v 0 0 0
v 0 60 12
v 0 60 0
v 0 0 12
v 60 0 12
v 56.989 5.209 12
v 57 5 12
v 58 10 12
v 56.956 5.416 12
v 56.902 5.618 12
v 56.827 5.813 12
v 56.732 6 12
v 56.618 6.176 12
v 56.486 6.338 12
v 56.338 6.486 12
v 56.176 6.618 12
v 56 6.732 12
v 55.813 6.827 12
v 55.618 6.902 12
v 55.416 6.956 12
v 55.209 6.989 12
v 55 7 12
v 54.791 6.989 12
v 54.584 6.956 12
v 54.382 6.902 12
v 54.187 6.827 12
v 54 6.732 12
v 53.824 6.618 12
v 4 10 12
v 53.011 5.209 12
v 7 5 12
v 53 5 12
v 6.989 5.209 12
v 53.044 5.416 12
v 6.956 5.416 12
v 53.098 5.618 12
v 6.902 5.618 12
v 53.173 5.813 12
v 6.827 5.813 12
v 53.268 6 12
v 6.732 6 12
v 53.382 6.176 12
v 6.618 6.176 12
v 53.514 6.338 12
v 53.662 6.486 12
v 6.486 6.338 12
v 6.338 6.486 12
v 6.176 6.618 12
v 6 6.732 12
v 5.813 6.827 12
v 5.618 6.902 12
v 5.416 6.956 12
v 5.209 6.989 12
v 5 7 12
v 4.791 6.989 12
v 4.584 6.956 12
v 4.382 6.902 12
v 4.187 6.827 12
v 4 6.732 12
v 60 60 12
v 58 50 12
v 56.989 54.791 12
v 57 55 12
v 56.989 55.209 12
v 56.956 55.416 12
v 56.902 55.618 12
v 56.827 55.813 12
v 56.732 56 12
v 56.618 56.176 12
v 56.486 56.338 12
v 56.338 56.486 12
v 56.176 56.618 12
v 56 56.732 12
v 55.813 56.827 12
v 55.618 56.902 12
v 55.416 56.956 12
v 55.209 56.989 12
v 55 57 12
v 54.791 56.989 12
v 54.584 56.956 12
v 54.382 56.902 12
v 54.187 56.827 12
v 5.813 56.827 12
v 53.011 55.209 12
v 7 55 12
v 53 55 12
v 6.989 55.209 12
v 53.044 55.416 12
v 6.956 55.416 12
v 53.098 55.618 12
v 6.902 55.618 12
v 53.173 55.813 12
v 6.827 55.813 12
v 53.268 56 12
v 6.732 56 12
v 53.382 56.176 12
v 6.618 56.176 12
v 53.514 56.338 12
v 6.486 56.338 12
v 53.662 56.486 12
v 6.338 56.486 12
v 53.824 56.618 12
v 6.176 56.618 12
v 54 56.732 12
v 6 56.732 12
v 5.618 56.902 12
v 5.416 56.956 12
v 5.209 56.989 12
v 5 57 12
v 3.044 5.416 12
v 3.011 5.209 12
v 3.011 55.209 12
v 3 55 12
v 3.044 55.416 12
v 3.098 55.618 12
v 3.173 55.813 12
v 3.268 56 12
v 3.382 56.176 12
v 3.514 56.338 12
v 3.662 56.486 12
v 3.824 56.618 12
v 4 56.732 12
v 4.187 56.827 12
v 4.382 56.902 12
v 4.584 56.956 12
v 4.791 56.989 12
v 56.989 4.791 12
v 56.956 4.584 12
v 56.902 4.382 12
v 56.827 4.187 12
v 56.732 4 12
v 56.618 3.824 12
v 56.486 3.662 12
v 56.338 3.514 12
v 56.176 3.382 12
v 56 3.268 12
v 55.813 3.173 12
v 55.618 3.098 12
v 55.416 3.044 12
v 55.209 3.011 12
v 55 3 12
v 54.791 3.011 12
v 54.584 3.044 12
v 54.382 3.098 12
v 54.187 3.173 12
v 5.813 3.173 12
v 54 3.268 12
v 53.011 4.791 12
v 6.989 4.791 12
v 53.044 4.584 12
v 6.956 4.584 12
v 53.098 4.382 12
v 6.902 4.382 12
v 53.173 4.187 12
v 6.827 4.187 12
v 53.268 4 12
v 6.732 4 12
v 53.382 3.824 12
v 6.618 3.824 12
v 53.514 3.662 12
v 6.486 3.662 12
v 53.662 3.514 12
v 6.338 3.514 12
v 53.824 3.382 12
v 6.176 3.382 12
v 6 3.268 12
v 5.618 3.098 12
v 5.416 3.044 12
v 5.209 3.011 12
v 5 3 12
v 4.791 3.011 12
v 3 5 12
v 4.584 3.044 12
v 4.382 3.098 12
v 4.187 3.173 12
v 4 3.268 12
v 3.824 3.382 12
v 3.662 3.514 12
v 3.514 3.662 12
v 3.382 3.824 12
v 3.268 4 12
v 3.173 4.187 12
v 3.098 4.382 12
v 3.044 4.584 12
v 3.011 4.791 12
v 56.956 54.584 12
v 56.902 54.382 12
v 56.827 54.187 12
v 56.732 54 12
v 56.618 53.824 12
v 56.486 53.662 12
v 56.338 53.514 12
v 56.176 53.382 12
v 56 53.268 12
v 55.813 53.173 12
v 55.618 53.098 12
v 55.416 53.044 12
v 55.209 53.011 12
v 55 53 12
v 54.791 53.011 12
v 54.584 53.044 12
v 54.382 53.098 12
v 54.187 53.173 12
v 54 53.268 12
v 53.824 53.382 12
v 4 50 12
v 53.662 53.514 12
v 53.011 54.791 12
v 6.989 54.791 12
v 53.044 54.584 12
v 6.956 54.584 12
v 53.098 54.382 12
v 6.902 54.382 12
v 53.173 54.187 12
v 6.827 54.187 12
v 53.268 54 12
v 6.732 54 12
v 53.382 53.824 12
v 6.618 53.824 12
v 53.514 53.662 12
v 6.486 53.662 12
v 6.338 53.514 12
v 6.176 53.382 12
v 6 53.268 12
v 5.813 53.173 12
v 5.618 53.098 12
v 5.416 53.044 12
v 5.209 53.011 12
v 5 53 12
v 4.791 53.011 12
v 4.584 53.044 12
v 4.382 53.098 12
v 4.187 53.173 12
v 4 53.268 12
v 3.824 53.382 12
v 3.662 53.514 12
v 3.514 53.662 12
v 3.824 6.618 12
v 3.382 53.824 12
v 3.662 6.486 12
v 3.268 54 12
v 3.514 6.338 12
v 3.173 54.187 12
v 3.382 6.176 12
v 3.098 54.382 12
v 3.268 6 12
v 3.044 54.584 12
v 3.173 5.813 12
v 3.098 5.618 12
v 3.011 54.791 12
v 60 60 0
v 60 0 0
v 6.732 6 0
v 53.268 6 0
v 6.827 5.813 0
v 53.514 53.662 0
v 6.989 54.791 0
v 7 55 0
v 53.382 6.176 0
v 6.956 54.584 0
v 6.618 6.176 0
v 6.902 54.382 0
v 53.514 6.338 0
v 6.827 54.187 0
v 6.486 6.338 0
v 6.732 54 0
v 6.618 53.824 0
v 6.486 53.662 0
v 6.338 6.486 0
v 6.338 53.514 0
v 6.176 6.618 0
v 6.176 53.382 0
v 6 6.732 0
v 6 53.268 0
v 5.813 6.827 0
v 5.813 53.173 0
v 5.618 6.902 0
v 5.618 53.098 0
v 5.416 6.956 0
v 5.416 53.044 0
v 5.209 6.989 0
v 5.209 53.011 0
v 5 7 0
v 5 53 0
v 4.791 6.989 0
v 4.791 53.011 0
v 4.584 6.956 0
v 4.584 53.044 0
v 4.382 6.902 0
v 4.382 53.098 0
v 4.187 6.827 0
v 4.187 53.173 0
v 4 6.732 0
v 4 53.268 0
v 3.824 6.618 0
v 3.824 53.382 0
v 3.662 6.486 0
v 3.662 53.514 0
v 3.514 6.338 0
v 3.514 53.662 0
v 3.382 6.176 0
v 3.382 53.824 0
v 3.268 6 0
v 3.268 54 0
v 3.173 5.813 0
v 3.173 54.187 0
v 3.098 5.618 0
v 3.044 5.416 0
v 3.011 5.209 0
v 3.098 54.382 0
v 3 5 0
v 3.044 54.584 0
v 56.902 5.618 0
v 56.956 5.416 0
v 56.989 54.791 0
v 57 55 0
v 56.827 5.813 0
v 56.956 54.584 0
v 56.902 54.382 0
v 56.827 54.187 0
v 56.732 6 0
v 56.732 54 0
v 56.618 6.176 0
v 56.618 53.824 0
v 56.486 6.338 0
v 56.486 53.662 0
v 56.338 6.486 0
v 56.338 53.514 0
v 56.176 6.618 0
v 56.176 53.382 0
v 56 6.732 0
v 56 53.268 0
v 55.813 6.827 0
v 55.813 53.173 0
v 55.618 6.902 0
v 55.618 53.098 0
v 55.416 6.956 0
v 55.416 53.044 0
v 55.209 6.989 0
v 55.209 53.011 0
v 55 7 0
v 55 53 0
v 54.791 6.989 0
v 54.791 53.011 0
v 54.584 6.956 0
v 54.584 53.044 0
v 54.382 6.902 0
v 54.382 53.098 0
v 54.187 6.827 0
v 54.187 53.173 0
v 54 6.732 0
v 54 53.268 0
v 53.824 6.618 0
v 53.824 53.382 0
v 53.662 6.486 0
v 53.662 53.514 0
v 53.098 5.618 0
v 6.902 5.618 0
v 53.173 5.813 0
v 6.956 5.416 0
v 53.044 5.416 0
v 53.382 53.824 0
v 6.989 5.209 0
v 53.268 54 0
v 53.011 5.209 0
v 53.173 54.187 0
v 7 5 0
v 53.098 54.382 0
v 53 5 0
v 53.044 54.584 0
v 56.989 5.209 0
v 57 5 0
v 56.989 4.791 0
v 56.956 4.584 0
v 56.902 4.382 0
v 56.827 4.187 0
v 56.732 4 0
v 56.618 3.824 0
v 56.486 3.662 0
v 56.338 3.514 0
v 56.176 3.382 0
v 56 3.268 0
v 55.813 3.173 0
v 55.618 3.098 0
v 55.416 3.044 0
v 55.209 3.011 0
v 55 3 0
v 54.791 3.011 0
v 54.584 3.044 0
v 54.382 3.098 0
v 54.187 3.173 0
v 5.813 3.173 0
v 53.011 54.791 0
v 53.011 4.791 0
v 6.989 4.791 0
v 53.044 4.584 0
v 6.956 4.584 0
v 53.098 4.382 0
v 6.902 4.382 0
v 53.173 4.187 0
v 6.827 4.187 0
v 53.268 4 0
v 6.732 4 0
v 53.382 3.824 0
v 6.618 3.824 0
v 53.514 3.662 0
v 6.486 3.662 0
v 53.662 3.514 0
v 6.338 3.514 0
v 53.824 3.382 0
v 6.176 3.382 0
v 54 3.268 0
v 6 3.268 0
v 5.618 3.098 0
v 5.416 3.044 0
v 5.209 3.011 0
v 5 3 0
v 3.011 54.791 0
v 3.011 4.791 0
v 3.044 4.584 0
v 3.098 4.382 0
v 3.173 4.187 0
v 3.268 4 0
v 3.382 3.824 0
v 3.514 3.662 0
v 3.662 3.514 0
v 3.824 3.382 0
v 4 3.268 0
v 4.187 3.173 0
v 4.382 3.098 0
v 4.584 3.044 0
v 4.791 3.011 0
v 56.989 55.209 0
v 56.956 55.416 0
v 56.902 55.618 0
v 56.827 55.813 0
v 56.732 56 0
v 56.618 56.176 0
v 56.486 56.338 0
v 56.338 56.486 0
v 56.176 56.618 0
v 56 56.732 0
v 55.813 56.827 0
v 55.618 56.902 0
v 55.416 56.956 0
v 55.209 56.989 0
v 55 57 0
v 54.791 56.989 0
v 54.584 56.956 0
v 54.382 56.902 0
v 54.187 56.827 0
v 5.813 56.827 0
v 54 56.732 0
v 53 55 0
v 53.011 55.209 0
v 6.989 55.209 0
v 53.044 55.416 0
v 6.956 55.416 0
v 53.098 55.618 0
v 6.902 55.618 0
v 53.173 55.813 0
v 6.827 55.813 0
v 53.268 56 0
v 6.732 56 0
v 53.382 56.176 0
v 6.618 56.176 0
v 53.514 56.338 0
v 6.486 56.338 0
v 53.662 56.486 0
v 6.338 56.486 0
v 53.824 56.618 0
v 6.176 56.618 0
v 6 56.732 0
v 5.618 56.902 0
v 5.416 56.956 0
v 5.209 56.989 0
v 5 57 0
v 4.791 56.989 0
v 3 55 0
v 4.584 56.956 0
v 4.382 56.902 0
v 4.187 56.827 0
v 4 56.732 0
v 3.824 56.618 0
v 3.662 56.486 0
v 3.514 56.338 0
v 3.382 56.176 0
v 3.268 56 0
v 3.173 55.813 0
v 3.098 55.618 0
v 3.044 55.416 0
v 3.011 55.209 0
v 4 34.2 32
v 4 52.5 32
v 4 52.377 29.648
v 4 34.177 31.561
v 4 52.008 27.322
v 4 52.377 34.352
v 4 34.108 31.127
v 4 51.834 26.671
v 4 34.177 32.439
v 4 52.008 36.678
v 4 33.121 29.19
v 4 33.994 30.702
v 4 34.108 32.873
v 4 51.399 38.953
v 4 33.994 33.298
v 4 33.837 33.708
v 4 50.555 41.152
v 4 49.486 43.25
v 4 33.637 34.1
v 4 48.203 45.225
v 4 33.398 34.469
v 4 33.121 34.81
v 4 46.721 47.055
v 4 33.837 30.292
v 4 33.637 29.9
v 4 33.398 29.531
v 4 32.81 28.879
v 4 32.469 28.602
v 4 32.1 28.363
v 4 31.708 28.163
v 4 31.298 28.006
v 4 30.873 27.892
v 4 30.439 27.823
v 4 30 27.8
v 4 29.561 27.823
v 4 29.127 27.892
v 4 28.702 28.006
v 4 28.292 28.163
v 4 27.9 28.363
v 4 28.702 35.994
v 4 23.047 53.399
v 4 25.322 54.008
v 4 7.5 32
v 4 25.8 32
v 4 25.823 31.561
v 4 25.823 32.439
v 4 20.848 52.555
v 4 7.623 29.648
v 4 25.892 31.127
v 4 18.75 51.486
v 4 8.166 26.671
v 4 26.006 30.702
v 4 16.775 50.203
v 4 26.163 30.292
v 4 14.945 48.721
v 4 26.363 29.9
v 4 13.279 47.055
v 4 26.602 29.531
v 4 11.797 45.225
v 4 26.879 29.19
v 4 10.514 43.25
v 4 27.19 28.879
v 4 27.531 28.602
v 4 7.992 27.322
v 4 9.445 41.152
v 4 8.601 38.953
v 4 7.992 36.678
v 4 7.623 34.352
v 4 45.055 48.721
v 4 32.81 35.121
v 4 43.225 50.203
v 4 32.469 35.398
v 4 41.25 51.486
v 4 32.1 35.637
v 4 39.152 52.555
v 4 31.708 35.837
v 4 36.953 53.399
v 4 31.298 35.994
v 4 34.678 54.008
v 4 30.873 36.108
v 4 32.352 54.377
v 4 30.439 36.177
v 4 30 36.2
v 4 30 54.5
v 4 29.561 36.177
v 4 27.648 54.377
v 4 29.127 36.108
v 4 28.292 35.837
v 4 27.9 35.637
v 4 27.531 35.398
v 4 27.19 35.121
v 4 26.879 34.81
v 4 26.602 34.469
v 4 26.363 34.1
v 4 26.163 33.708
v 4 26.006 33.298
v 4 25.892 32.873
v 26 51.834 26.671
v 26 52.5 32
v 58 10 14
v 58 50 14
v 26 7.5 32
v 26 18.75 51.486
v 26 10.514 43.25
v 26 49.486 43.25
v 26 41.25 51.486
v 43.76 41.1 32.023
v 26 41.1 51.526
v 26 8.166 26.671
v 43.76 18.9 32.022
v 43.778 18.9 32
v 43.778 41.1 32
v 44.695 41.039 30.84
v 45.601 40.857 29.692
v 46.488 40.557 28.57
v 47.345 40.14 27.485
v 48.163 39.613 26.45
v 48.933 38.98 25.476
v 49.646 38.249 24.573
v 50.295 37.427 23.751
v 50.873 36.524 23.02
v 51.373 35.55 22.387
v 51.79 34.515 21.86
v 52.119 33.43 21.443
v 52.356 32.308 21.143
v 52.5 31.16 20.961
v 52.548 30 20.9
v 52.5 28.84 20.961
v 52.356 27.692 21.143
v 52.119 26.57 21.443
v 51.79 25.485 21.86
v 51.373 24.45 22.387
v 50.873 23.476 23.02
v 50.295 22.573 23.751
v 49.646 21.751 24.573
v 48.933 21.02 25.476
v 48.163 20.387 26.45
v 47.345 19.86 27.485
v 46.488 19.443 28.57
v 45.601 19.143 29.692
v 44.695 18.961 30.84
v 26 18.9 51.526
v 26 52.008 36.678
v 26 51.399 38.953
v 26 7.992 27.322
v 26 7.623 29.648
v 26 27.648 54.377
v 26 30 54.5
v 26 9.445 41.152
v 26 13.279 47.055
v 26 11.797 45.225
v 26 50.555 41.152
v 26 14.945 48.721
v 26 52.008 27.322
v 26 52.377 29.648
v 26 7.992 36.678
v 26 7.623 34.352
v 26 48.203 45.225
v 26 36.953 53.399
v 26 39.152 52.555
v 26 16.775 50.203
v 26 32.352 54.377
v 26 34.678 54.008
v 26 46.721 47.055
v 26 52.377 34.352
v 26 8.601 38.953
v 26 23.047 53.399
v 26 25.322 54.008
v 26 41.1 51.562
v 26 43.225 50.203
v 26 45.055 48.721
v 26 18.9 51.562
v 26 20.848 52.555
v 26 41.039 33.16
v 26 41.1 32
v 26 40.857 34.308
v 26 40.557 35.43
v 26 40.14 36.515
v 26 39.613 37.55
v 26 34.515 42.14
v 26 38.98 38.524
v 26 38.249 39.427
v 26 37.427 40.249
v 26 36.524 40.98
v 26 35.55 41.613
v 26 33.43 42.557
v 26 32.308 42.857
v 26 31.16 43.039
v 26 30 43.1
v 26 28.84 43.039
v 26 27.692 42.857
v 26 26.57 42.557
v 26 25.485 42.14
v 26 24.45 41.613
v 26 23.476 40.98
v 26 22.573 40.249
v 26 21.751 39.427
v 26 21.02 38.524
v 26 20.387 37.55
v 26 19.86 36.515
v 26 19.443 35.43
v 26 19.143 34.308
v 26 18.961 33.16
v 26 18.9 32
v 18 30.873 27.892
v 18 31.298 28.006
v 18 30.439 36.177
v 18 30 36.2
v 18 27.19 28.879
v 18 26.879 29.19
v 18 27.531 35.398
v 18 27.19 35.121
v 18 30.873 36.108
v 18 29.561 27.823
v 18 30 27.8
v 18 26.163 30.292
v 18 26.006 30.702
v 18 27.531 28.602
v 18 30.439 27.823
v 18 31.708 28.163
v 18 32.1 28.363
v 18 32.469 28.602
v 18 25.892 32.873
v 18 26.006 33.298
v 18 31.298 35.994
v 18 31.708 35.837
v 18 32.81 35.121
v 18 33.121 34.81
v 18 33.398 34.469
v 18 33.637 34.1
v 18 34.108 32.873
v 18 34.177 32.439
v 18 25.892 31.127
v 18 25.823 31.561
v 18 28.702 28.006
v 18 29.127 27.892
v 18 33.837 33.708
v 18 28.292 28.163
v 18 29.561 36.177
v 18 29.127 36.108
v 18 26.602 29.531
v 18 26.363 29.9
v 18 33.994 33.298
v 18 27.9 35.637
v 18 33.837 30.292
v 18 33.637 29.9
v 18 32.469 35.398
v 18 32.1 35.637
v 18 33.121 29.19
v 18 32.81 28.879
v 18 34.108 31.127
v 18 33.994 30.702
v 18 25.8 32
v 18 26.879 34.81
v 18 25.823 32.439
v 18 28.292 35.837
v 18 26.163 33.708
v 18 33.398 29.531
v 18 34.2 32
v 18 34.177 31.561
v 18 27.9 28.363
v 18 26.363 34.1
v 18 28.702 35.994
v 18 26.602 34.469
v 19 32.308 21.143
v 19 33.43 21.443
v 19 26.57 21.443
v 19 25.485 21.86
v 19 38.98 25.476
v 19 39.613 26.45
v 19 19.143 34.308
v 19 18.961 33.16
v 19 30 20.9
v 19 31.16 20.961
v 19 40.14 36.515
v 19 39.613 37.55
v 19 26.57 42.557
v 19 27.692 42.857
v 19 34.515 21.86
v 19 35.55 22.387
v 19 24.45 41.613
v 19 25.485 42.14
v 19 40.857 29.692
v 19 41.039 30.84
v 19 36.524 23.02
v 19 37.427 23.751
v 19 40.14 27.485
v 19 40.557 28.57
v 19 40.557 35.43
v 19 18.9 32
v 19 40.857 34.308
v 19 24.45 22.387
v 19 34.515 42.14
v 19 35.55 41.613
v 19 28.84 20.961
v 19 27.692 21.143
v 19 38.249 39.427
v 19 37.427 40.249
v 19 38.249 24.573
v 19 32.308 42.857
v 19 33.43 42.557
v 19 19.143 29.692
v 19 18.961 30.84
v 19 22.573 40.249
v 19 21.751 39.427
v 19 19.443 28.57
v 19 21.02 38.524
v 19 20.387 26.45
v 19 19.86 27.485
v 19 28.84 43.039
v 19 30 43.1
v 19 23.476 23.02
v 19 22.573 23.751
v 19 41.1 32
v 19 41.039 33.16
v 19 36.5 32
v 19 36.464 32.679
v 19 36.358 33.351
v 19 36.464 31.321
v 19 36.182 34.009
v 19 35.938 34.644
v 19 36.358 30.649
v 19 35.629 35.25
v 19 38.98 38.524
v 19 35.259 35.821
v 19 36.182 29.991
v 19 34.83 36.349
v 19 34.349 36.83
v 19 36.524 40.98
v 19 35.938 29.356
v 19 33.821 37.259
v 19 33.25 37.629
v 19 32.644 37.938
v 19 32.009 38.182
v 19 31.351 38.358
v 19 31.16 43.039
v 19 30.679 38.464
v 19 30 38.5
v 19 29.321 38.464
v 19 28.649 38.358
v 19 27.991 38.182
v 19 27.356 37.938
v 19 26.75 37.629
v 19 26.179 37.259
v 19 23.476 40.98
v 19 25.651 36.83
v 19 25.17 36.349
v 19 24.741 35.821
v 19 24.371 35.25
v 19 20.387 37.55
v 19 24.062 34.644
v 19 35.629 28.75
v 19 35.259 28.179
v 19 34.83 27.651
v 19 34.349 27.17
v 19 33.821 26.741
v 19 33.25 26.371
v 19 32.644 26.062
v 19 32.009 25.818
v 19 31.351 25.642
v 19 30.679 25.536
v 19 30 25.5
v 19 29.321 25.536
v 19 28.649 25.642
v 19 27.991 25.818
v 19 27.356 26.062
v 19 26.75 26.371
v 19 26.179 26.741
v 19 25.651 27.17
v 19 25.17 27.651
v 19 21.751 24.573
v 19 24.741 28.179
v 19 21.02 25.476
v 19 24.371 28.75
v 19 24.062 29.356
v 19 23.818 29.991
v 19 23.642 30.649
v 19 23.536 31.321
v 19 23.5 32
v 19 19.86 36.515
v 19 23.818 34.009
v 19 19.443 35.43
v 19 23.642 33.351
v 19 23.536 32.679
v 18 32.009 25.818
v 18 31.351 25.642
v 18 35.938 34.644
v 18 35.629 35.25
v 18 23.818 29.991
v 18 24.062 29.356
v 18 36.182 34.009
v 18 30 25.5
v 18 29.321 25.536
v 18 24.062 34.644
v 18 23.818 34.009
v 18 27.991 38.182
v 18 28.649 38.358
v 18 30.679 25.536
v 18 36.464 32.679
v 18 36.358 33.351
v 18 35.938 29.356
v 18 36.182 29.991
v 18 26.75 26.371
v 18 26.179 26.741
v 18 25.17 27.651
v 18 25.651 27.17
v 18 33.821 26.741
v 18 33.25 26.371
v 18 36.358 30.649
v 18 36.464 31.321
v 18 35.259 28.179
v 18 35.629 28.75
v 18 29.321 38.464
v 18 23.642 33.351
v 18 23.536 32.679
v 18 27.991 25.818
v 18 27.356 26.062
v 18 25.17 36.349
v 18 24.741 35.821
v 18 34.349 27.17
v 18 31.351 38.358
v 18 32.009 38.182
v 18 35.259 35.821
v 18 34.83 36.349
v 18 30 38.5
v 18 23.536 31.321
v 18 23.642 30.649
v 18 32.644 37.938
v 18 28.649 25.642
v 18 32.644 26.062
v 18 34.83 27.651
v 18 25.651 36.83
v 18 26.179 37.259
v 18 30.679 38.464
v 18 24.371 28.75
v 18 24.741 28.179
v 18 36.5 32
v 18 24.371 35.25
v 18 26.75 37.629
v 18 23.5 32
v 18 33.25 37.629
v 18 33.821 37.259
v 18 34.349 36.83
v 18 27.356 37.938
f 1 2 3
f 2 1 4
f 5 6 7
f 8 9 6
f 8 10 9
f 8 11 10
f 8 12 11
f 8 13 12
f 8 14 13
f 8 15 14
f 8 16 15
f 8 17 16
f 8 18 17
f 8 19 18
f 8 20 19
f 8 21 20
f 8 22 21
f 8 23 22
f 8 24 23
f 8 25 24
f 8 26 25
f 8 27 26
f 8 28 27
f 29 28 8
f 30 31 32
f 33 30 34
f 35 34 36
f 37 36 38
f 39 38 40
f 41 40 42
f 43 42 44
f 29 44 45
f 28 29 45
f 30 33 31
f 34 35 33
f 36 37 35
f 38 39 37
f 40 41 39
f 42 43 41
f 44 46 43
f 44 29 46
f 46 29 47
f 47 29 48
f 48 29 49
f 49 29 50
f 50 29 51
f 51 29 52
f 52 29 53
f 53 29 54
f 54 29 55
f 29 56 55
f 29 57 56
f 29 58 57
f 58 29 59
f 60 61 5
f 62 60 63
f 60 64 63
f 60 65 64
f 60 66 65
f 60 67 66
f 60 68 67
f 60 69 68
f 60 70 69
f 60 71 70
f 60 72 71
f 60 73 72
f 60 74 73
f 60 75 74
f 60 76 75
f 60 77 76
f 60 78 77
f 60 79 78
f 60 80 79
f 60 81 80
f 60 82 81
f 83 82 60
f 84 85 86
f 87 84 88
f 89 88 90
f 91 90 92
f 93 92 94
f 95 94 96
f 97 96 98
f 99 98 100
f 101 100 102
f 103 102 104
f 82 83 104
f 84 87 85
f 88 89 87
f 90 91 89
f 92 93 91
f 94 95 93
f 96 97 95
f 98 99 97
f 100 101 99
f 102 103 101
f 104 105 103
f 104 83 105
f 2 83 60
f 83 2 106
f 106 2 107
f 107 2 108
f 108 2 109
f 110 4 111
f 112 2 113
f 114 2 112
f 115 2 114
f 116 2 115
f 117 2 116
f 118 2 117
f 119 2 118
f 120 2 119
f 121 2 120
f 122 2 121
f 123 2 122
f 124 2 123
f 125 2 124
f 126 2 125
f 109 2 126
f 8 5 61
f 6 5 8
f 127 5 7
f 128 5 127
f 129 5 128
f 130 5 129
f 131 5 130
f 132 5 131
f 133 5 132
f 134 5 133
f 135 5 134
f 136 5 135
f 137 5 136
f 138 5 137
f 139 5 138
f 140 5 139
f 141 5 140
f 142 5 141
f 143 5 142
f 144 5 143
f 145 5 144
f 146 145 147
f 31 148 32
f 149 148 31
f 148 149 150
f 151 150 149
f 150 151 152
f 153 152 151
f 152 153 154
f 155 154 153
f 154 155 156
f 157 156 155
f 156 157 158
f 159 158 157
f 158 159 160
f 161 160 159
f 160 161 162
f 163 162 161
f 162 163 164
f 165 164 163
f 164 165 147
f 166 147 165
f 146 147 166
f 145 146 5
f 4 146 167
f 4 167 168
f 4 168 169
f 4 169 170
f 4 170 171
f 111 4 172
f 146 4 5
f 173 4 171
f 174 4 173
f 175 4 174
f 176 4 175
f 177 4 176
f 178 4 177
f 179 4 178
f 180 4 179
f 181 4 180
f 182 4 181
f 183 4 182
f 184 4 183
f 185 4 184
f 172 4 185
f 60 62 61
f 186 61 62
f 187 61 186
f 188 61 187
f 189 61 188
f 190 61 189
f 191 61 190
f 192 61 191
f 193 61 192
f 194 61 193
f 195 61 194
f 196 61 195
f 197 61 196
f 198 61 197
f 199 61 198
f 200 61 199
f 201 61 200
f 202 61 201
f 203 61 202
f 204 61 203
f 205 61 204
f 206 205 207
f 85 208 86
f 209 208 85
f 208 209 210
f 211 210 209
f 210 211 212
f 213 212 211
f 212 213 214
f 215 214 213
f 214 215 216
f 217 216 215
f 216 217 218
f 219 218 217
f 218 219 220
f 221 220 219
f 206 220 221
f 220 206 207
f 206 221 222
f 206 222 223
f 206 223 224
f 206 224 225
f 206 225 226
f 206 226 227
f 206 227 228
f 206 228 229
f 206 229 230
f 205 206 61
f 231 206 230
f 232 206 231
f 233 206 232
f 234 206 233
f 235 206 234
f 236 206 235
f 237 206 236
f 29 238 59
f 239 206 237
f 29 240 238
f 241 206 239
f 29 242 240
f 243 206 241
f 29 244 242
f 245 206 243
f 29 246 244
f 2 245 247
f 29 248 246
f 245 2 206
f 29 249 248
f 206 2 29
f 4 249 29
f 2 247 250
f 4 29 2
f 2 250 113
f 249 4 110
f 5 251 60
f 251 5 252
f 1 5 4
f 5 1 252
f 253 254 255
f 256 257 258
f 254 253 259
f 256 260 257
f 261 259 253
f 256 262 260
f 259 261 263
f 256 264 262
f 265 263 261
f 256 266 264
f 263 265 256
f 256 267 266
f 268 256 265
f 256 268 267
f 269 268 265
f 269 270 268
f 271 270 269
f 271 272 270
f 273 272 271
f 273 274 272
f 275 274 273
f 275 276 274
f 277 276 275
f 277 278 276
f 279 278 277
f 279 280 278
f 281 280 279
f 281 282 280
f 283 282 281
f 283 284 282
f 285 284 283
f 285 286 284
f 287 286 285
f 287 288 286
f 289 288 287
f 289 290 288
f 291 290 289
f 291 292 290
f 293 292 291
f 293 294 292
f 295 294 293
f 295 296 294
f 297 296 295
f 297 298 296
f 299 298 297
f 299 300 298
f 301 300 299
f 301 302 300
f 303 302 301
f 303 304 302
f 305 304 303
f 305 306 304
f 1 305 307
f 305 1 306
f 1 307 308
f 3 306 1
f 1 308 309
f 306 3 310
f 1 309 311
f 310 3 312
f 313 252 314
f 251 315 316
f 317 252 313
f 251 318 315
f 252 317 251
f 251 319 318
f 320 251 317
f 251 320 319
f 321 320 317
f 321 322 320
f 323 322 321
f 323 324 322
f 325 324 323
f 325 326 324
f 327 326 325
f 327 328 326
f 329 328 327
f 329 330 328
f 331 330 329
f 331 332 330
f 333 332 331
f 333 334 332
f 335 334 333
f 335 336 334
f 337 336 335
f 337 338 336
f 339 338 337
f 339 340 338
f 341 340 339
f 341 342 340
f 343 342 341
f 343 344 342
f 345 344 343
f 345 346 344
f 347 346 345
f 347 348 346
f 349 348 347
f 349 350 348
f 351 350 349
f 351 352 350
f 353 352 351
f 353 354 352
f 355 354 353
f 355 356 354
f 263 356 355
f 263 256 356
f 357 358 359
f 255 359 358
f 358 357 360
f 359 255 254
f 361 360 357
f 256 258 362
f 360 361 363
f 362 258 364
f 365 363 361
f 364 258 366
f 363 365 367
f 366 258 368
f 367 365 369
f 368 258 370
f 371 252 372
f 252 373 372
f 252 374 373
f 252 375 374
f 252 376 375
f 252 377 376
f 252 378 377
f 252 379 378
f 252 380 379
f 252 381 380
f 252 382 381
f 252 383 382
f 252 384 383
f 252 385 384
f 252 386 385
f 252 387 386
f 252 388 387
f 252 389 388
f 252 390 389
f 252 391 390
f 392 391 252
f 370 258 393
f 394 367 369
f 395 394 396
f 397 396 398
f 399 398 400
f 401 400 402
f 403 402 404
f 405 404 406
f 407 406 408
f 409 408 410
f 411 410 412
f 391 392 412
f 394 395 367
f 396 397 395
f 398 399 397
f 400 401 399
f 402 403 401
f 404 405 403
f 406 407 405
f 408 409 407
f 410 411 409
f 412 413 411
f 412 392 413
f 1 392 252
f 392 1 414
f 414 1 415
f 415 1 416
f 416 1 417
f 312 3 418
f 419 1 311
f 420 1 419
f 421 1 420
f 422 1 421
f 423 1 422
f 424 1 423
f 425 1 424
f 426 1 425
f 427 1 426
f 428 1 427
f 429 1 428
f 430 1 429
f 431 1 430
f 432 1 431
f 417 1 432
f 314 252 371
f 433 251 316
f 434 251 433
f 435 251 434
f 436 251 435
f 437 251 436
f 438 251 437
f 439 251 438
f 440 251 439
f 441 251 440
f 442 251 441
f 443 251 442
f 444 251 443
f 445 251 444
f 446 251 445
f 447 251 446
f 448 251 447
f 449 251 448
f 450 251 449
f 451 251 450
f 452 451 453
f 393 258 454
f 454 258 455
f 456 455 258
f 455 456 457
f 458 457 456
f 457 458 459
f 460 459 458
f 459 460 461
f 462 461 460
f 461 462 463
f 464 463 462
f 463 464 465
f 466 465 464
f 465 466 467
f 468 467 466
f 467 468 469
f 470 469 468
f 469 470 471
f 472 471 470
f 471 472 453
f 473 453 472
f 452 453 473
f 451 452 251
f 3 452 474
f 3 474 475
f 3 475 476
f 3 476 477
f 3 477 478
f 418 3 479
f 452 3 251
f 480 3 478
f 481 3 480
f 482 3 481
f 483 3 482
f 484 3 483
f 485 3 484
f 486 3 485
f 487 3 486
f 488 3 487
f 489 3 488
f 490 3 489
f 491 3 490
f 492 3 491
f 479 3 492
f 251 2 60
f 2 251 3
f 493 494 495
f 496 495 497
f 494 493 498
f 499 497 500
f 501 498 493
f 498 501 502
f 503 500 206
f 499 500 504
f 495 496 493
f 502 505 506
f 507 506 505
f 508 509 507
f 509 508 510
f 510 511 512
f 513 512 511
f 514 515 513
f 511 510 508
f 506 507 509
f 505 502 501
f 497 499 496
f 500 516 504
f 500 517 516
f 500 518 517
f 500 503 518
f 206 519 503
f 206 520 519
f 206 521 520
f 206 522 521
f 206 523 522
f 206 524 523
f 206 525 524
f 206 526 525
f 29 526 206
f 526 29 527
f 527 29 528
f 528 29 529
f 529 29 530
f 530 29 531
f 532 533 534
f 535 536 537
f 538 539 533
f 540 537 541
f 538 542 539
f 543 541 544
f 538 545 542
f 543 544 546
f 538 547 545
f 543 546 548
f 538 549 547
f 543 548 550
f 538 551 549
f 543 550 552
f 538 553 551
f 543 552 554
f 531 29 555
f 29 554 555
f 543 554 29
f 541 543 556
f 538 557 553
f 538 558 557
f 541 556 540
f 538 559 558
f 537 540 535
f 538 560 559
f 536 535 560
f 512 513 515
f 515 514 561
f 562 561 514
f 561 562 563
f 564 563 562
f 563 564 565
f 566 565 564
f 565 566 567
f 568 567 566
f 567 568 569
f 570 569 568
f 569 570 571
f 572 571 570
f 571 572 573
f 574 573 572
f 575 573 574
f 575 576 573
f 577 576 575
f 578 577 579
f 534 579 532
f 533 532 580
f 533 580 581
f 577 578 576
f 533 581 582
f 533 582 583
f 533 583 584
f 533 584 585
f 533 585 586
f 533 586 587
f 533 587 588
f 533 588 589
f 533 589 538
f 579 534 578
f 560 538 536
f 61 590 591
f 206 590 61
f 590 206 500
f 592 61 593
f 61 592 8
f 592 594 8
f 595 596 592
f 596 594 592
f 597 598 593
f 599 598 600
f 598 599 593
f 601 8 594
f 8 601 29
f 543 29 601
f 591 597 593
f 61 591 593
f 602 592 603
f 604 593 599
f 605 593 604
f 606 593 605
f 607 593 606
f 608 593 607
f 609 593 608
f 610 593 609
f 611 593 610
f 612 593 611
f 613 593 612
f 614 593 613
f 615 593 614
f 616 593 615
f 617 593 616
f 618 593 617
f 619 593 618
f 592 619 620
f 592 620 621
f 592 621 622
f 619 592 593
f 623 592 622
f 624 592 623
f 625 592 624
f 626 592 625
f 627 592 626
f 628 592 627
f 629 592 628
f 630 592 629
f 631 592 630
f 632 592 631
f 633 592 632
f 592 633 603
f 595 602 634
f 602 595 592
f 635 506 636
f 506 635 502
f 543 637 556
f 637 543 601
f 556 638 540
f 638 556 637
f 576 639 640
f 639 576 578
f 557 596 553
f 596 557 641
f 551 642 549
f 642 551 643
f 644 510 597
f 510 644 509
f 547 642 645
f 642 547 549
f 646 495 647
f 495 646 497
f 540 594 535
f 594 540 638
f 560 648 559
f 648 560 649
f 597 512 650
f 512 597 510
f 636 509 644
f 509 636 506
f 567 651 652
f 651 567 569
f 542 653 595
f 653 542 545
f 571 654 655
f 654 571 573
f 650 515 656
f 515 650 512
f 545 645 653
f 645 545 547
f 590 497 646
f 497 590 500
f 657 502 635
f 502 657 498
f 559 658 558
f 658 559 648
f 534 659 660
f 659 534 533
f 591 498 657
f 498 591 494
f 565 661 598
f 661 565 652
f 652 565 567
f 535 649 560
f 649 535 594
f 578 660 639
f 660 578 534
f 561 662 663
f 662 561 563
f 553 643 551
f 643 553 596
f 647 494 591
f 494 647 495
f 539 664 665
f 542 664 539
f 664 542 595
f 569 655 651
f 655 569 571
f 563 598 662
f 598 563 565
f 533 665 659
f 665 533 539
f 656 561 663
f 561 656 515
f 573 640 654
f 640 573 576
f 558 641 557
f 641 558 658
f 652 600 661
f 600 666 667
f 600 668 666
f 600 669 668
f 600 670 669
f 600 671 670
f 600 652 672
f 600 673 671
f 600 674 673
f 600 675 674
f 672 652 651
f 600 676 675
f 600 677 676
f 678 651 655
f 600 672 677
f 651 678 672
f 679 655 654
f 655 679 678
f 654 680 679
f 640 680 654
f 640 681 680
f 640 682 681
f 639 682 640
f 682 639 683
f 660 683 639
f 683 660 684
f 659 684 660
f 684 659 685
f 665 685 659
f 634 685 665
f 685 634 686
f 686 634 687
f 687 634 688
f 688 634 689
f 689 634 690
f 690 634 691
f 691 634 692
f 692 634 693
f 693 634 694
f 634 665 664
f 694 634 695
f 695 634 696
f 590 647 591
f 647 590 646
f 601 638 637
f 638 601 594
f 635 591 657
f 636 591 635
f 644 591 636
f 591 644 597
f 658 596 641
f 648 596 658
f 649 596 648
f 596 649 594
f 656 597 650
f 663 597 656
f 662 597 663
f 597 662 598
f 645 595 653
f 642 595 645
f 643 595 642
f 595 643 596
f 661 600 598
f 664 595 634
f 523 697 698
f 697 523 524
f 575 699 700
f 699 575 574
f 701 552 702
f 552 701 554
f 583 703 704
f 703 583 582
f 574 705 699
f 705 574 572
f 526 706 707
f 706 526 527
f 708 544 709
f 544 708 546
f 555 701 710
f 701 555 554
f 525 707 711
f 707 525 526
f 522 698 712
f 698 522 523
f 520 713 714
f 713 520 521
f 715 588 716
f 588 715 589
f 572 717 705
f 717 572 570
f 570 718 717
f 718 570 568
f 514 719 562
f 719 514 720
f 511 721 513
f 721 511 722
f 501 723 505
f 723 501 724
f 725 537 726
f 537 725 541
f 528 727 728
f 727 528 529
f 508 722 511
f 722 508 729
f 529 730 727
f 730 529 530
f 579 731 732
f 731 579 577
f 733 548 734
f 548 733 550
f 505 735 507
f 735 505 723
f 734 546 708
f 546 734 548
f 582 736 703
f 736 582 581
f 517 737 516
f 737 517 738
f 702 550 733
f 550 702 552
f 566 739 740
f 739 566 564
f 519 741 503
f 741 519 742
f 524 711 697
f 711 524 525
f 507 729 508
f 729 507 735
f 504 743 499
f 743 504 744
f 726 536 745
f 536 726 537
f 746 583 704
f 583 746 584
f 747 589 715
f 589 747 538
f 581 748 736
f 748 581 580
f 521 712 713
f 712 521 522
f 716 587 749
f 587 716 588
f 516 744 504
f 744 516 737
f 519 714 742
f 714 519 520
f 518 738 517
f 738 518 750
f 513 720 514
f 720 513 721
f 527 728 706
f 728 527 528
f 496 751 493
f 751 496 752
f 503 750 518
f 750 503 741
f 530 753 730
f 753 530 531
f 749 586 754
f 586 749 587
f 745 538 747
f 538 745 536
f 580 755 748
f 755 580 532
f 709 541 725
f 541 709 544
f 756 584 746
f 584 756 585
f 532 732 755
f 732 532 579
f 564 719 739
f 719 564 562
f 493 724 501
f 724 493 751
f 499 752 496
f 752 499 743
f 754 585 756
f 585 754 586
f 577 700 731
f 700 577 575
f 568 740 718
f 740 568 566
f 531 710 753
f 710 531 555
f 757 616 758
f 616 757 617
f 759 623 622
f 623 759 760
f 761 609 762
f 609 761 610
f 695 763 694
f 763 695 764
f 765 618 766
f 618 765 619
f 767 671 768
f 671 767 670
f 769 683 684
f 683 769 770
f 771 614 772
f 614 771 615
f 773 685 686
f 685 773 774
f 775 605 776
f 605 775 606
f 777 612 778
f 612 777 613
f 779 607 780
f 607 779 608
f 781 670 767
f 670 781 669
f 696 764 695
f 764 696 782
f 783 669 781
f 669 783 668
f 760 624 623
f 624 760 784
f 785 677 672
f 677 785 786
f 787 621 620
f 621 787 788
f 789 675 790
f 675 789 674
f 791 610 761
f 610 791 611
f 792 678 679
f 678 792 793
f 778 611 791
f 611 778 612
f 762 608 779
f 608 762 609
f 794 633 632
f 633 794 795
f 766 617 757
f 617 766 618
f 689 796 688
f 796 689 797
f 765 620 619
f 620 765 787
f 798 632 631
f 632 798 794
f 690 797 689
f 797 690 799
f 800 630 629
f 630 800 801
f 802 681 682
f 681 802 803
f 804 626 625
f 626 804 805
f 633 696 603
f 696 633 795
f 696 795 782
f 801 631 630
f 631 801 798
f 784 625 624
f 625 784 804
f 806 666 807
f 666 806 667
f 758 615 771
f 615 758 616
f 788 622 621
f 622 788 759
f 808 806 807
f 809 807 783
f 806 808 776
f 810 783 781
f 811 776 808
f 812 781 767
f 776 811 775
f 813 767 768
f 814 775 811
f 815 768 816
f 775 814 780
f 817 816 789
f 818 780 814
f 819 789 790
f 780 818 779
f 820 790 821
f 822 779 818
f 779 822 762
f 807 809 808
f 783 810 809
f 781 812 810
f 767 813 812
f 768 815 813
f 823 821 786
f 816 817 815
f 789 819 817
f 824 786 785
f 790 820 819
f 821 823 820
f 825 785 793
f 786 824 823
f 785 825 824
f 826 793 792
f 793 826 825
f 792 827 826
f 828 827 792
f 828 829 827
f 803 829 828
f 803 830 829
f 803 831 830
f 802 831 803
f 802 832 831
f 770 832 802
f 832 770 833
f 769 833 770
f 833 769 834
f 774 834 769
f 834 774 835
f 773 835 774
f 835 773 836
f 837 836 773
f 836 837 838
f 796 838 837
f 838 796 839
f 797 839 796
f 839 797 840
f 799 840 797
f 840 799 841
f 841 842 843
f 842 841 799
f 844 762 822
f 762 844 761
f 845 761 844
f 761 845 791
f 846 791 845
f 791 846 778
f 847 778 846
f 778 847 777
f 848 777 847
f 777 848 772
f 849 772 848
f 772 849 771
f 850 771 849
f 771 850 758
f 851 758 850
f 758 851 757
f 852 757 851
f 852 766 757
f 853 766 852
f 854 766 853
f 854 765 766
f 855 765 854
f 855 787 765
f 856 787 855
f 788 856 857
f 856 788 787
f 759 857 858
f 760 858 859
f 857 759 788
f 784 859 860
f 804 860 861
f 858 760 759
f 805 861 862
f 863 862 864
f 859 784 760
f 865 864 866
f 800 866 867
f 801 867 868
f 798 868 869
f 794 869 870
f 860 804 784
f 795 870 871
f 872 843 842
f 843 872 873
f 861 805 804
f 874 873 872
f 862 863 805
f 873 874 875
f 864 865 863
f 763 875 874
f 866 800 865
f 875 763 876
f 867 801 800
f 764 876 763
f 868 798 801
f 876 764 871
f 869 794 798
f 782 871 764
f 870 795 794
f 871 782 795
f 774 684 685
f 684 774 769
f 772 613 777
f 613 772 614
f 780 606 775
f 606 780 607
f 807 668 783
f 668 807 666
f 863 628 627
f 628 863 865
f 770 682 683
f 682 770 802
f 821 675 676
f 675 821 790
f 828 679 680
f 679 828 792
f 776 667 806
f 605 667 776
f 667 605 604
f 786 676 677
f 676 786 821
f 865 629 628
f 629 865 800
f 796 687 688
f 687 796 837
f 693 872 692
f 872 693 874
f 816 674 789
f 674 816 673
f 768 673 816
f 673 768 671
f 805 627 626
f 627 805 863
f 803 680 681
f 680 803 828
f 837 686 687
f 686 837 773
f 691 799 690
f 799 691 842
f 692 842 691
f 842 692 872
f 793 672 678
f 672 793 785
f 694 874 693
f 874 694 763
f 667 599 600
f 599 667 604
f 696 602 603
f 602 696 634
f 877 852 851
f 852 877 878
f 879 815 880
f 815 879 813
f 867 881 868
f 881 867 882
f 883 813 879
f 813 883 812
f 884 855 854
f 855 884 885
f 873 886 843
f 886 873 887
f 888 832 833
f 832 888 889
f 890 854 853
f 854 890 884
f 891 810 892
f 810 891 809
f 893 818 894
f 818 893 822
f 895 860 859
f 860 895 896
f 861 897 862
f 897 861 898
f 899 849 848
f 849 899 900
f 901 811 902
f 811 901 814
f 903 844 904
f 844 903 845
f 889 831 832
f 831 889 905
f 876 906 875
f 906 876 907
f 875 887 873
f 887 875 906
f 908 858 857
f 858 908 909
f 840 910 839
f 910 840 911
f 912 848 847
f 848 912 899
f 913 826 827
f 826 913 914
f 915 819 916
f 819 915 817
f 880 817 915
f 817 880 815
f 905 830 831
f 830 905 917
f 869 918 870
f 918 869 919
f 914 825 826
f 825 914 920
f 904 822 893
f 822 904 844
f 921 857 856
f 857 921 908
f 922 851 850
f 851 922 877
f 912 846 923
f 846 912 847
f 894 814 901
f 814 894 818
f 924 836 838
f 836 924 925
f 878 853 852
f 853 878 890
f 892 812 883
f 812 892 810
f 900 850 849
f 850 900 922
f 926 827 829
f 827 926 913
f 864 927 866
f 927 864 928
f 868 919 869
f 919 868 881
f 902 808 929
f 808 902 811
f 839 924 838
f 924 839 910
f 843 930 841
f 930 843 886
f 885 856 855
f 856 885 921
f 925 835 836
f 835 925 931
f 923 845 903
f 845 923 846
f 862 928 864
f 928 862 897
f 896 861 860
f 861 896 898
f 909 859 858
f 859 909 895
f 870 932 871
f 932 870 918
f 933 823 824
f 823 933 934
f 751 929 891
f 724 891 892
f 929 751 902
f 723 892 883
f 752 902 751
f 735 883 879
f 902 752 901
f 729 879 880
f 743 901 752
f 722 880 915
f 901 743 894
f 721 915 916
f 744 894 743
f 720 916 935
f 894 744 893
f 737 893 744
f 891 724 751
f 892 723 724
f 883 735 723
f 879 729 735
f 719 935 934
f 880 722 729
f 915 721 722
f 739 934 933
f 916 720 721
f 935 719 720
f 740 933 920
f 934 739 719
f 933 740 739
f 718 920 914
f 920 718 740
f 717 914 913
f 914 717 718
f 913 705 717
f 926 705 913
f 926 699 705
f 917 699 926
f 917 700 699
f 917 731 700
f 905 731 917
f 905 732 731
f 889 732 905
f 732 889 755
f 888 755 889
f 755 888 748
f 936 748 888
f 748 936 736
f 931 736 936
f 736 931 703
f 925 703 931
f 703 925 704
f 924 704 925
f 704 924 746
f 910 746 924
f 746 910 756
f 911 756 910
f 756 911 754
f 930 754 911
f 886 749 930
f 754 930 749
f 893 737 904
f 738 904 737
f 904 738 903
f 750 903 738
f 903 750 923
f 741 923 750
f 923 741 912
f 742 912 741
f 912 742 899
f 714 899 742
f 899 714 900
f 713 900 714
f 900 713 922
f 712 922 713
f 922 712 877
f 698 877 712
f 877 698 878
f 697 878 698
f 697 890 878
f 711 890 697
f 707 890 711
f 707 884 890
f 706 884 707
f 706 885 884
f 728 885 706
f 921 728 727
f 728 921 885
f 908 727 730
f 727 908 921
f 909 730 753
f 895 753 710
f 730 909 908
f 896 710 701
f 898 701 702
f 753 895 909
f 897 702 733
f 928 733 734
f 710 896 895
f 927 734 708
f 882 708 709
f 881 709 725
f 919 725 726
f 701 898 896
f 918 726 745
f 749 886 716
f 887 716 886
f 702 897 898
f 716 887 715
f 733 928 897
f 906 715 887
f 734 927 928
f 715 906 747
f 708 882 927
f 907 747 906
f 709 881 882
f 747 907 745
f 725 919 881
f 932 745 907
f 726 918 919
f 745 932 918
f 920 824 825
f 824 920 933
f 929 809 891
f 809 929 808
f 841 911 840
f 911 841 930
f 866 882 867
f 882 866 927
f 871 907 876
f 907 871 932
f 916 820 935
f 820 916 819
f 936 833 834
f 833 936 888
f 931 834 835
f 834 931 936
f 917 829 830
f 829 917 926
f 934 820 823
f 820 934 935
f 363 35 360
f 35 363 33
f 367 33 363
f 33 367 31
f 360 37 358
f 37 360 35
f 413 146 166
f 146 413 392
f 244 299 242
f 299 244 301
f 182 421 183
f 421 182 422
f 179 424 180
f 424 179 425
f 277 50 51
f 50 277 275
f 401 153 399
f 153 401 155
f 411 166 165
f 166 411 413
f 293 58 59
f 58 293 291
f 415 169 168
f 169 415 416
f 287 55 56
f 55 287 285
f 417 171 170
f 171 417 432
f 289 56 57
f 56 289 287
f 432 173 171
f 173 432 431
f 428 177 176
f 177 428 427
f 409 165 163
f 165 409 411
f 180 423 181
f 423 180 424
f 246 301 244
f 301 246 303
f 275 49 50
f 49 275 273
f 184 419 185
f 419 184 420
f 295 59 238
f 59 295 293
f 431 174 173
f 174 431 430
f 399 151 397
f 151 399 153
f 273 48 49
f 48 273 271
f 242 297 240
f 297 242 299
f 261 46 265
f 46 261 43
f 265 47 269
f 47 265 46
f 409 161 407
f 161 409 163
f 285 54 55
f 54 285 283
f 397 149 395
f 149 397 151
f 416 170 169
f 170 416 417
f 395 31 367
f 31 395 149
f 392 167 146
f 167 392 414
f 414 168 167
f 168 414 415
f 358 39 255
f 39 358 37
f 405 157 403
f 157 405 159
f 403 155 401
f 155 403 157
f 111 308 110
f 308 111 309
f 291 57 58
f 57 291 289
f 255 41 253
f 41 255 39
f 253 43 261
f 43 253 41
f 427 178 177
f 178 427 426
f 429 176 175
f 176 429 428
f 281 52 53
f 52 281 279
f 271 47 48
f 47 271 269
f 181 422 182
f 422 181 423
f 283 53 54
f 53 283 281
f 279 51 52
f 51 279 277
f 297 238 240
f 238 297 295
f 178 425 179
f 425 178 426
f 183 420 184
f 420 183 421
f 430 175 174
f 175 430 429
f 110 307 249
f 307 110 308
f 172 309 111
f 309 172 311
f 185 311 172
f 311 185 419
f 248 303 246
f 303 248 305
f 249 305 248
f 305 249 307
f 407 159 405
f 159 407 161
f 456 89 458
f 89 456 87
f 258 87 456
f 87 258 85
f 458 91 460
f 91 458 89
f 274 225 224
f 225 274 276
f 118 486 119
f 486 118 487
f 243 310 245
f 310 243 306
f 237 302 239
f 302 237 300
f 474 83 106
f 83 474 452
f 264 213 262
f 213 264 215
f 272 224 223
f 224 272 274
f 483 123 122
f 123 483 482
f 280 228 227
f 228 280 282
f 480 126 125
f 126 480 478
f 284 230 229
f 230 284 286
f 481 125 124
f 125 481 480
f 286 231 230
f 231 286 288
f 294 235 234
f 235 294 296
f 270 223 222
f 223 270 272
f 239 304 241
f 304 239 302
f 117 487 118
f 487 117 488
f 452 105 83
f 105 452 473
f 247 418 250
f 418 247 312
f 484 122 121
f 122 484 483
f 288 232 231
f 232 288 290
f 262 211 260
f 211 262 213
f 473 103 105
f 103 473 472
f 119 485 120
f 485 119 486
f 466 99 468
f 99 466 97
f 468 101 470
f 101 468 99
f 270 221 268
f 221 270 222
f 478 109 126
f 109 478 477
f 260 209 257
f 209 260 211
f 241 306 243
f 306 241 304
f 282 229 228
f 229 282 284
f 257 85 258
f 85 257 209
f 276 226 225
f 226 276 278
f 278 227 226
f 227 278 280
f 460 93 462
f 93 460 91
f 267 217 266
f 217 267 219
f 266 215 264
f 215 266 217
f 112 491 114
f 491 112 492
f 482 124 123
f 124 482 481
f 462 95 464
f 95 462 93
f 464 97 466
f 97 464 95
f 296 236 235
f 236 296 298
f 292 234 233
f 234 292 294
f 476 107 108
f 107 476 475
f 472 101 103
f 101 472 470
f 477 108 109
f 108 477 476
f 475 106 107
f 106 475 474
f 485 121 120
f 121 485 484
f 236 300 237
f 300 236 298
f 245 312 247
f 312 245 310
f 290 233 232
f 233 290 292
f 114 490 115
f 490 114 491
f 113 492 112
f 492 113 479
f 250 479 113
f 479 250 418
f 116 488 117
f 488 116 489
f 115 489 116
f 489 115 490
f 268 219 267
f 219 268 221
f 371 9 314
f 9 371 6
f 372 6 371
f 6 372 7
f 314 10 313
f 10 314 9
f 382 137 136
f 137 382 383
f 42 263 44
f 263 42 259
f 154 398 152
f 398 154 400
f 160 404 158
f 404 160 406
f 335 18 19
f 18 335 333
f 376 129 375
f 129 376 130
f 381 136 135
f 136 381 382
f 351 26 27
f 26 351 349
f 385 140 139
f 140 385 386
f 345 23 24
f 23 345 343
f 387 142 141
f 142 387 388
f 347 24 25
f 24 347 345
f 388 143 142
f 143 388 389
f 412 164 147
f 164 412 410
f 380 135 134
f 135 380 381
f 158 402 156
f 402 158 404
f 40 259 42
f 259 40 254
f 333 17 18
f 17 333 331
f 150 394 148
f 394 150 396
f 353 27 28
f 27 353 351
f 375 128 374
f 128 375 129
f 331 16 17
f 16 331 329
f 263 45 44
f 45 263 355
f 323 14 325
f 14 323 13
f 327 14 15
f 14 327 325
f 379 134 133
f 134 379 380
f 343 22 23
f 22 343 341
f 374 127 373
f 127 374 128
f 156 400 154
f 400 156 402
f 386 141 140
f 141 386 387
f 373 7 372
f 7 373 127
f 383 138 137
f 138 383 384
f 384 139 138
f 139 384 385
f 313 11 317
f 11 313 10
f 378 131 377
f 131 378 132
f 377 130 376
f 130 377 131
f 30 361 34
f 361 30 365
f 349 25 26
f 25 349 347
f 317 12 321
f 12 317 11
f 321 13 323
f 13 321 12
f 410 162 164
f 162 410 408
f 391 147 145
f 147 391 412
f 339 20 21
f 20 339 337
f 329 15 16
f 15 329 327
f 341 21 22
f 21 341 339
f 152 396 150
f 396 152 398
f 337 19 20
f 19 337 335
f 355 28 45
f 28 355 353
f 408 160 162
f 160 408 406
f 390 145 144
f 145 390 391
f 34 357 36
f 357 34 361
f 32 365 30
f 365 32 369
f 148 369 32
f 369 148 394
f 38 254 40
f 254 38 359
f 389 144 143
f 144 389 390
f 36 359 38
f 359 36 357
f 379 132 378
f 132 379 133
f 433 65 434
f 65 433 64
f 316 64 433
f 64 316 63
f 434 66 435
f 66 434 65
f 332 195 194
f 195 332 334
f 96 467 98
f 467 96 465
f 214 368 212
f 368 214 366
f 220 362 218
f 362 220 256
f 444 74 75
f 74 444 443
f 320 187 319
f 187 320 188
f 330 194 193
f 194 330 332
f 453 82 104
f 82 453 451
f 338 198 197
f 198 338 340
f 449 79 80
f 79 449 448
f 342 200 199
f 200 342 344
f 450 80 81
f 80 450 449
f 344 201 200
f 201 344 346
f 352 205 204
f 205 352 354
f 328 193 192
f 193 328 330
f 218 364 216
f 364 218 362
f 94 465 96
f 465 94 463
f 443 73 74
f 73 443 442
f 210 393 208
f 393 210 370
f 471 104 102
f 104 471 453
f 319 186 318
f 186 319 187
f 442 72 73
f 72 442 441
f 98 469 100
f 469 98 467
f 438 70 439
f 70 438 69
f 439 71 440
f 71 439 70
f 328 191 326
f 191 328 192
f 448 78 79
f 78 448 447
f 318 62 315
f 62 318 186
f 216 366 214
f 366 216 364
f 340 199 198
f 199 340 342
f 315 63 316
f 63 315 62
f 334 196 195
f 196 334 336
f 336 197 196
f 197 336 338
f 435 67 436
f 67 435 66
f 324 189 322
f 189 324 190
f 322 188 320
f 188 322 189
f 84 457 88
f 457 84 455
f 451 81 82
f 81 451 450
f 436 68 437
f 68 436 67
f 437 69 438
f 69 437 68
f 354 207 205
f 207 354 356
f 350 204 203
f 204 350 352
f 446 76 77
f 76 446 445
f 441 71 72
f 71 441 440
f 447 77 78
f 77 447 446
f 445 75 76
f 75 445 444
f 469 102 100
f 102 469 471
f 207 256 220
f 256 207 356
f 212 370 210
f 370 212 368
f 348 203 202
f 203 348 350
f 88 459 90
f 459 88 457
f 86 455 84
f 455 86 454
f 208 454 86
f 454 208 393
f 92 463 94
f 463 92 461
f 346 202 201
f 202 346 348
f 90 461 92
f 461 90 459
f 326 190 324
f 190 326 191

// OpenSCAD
module plate() {
	distance=20;
	difference() {
		union() {
			// plate with nice rounded edge
			hull() {
				cube([60, 60, 12]);
				*minkowski() {
					cube([60, 60, 1]);
					cylinder(r=2, h=1, $fn=60);
				}
			}
			// main block
			hull() {
				*translate([4,60/2-36/2,12]) cube([22, 36, 30]);
				translate([4,60/2-40/2,12]) cube([54, 40, 2]);
				translate([4,60/2,12+distance]) rotate([0,90,0]) cylinder(r=45/2,h=22, $fn=12);
			}
			translate([4,60/2,12+distance]) rotate([0,90,0]) cylinder(r=45/2,h=18, $fn=60);
			// bearing
			translate([4+12,60/2,12+distance]) rotate([0,90,0]) cylinder(r=45/2,h=10, $fn=60);
		}
		union() {
			// main screw
			translate([4-1,60/2,12+distance]) rotate([0,90,0]) cylinder(r=8.4/2,h=25, $fn=60);
			// bearing
			translate([4+12+3,60/2,12+distance]) rotate([0,90,0]) cylinder(r=22.2/2,h=40, $fn=60);
			hull() for(z=[0,20])
				translate([4+12+3+7,60/2,12+distance+z]) rotate([0,90,0]) cylinder(r=22.2/2,h=40, $fn=60);
			translate([4+12+2,60/2,12+distance]) rotate([0,90,0]) cylinder(r=13/2, h=2, $fn=60);
			// wall screws
			translate([5,5,-1]) cylinder(r=4/2, h=12+2, $fn=60);
			translate([5,60-5,-1]) cylinder(r=4/2, h=12+2, $fn=60);
			translate([60-5,5,-1]) cylinder(r=4/2, h=12+2, $fn=60);
			translate([60-5,60-5,-1]) cylinder(r=4/2, h=12+2, $fn=60);
		}
	}
}

plate();
